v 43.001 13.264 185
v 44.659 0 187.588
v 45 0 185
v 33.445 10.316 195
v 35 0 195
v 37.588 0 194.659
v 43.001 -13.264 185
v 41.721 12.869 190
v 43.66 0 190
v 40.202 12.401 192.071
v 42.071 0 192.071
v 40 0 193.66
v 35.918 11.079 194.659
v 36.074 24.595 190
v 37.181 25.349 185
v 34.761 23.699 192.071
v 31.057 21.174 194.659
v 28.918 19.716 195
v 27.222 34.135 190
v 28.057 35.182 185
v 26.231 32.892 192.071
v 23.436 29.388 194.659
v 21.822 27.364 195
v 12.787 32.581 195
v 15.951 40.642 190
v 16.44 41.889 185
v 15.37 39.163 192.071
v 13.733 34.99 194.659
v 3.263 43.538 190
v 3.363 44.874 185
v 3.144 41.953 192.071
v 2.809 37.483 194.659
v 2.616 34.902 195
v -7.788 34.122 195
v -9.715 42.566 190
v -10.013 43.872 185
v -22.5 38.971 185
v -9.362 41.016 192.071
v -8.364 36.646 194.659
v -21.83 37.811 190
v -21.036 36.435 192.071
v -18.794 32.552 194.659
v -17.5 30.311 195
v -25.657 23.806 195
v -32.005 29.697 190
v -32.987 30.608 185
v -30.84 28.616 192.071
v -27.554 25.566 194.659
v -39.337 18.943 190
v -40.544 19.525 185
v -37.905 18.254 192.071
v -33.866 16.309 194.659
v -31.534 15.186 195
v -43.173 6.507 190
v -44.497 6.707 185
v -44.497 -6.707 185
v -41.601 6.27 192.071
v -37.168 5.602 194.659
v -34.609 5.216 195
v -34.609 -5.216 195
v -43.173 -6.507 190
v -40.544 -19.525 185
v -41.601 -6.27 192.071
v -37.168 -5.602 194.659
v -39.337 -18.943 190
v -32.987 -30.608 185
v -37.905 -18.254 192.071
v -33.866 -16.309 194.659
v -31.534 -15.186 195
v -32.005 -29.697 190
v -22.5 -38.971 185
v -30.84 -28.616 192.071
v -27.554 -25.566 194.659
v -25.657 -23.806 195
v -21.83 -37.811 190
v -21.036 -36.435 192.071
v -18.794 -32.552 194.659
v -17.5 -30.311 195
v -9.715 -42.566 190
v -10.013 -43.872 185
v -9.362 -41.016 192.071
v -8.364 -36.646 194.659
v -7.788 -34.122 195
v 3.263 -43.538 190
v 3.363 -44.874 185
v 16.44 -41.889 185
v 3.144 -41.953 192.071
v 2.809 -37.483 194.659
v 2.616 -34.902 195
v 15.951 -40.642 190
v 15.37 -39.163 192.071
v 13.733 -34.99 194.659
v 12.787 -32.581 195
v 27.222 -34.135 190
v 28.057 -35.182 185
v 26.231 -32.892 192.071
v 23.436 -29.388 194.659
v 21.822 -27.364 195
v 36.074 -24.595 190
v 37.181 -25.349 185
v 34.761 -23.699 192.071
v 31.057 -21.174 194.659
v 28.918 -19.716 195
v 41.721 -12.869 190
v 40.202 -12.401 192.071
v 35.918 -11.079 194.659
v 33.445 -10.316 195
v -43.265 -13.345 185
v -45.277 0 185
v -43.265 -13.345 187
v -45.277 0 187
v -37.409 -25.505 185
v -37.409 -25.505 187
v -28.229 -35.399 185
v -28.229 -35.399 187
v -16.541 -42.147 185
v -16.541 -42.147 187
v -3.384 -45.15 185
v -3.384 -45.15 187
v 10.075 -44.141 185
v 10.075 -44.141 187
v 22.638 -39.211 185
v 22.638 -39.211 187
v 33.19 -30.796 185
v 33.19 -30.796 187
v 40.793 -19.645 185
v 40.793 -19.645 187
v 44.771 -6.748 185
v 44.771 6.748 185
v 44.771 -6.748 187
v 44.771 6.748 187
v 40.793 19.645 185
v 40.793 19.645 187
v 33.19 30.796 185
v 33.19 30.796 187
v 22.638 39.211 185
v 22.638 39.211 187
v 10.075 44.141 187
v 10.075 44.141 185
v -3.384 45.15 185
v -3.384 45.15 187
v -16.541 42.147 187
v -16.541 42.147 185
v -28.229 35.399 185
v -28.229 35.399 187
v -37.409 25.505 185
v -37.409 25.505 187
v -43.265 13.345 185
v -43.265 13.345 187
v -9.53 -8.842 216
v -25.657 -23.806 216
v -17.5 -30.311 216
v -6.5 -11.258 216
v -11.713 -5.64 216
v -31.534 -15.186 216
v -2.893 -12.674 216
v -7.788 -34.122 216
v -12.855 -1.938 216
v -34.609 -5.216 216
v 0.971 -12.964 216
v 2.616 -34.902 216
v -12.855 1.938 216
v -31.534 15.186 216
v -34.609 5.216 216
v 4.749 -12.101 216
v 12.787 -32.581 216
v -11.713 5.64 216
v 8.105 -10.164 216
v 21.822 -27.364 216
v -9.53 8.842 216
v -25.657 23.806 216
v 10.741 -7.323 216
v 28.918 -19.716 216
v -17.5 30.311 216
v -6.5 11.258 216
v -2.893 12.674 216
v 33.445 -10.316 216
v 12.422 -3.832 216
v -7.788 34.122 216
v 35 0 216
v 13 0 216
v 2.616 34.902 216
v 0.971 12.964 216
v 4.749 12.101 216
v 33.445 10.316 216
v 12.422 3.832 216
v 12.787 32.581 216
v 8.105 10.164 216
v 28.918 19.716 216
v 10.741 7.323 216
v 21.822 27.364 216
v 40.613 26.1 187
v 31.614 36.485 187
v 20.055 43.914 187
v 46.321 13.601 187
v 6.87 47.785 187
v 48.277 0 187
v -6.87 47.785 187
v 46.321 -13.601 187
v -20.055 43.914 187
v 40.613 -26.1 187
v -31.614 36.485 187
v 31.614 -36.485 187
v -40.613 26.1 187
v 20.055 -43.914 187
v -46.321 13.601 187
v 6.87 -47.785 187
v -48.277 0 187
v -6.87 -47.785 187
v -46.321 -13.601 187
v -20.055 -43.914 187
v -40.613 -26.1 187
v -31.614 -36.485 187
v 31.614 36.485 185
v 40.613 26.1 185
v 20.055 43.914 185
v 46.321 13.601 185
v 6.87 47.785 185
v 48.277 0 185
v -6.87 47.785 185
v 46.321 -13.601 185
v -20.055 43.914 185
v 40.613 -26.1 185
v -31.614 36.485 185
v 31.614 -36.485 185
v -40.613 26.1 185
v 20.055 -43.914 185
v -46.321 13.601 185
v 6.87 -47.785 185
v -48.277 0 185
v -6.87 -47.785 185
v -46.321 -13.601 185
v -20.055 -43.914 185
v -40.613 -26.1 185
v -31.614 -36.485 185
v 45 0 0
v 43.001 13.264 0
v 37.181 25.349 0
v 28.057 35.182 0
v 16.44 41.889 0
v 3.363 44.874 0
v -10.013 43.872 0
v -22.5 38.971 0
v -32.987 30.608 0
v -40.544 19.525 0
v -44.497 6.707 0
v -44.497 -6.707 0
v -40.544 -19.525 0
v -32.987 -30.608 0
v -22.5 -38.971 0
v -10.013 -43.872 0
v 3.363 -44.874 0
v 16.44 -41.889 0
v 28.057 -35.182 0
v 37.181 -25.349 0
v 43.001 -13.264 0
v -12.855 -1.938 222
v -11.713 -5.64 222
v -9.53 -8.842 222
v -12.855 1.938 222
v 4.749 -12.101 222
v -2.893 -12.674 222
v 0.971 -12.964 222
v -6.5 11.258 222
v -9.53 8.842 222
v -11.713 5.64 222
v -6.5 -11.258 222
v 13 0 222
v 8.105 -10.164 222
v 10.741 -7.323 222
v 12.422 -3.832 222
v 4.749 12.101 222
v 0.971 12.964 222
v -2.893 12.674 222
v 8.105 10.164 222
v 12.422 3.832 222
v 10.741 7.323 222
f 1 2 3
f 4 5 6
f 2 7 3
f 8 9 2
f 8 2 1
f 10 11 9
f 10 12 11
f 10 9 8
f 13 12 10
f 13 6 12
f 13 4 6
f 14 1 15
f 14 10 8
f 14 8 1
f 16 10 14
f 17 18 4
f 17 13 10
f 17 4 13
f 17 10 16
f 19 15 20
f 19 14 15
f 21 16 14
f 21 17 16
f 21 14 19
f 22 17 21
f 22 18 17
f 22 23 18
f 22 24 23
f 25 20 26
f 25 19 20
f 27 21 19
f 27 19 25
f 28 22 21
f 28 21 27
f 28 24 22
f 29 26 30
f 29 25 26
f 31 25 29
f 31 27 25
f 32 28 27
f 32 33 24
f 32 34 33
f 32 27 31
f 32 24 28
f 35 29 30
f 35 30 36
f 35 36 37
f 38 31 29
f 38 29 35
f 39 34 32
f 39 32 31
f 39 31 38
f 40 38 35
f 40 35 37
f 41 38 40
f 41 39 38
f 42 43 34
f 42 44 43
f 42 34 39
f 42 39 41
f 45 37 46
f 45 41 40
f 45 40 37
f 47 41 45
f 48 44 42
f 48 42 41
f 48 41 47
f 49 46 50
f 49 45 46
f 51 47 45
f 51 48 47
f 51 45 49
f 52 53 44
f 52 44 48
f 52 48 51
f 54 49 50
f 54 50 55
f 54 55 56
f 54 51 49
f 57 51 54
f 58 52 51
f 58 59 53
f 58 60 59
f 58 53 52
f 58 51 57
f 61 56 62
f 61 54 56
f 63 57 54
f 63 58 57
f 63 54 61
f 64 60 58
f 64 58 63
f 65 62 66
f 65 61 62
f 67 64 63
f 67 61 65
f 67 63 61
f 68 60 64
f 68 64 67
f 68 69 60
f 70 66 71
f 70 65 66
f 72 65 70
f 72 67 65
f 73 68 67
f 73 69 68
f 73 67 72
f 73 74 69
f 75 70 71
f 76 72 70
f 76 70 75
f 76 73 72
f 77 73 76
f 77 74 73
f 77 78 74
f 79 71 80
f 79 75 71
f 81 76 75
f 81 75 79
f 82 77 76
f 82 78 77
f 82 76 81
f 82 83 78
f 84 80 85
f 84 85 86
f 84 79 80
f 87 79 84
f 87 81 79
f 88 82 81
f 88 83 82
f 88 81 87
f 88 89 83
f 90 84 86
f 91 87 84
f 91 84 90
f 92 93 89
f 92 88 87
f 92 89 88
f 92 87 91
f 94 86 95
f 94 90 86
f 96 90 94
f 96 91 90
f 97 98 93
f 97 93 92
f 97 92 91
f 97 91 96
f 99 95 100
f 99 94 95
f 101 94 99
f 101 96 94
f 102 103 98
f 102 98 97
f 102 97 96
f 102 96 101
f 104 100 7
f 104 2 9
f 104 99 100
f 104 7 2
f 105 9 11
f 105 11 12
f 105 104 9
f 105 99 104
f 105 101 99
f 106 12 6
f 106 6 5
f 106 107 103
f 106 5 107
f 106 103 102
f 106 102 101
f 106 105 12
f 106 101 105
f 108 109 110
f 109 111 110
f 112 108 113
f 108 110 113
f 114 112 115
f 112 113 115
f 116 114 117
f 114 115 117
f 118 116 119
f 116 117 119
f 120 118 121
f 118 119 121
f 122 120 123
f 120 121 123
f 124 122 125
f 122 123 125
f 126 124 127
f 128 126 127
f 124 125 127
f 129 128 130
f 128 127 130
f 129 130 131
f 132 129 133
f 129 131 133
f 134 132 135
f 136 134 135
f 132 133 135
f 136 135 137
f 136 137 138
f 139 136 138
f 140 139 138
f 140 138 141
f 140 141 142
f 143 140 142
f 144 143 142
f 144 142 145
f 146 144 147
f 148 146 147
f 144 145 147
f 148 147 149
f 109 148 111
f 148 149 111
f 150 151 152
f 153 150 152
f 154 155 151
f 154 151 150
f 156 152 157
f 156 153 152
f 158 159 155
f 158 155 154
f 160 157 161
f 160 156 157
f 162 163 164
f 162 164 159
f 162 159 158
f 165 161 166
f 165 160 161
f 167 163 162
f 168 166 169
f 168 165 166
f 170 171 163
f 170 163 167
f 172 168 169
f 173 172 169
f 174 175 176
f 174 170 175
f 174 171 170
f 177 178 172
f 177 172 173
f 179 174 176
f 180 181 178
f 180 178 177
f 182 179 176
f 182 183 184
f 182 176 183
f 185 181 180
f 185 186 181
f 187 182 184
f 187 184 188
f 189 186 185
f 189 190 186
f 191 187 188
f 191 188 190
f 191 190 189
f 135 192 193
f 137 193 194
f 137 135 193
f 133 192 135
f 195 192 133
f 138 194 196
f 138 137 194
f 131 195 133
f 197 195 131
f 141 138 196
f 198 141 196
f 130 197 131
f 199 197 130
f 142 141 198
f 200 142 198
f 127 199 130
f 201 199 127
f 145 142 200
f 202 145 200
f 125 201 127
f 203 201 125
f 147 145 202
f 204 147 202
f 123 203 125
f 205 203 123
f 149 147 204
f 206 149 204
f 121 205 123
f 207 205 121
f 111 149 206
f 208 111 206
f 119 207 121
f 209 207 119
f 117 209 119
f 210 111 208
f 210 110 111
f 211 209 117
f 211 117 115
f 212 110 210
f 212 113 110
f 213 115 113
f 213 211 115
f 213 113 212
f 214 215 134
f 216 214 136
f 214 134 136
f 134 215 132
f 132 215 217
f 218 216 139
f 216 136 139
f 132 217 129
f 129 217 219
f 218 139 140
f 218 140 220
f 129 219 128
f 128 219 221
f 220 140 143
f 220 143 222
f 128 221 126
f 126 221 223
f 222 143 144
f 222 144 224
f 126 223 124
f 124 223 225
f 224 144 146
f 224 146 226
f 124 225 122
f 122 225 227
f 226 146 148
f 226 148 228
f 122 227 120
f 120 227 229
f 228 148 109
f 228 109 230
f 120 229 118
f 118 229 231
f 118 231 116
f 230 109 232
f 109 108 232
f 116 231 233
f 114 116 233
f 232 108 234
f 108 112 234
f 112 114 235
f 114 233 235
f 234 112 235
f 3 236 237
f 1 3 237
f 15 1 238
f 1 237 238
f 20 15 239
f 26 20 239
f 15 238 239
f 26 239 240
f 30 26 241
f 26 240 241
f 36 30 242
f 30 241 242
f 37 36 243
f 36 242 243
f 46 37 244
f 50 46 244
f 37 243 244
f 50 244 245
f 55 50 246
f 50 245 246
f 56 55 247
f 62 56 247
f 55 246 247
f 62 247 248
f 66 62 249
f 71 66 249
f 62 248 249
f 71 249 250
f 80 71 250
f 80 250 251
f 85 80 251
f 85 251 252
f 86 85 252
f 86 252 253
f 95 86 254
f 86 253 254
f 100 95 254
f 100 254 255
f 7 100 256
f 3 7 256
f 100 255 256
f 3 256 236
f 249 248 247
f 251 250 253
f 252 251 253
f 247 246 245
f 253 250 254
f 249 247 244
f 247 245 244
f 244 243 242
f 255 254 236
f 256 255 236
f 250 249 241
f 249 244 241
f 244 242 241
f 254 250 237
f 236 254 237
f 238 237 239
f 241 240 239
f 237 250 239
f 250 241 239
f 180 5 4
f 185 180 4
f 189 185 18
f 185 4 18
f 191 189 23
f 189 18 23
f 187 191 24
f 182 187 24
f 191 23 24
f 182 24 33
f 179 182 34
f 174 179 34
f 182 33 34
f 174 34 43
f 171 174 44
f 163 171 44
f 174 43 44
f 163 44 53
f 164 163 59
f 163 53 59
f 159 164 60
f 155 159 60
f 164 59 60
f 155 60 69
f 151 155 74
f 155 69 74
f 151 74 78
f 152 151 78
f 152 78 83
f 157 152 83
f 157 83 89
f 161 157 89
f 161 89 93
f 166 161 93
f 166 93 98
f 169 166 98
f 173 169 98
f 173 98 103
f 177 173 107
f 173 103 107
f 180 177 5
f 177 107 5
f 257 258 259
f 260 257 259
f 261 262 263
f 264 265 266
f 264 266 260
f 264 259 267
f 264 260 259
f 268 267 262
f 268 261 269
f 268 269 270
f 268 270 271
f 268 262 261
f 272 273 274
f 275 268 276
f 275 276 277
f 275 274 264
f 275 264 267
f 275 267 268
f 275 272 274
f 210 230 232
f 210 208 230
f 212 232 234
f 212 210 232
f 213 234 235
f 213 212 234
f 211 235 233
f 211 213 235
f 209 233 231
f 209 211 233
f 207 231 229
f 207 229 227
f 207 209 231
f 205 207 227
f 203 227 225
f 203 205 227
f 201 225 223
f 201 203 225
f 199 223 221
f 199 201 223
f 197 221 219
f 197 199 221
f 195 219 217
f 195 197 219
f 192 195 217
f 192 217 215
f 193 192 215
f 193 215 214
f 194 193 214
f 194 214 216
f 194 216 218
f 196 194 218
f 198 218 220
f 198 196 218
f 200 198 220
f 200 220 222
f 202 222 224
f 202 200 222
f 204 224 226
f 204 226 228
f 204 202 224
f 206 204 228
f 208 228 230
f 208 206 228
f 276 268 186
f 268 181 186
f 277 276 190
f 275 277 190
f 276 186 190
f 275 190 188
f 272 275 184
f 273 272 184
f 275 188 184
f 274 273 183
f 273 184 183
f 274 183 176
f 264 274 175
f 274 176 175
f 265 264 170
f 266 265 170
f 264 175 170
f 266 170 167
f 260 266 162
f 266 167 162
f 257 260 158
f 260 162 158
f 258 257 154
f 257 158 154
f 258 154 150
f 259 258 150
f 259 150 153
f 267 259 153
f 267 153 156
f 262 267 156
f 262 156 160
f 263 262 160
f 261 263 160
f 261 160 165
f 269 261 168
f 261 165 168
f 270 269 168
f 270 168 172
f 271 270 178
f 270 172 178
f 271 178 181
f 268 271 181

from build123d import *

# Parameters (mm, degrees)
F0_R      = 45
F1_DEPTH  = 195
F2_R      = 10
F3_R      = 35
F4_DEPTH  = 21
F5_W      = 3
F5_H      = 2
F7_R      = 13
F8_DEPTH  = 3
F9_R      = 13
F10_DEPTH = 3


with BuildPart() as f1:
    # F0 (on Top) → F1 (new body)
    with BuildSketch(Plane.XY):
        Circle(F0_R)
    extrude(amount=F1_DEPTH)

    # F2
    f2_edges = [f1.edges().sort_by_distance(p)[0] for p in [
        (-45, 0, 195),
    ]]
    fillet(f2_edges, radius=F2_R)

    # F3 (on face) → F4 (join)
    with BuildSketch(Plane.XY.offset(195)):
        Circle(F3_R)
    extrude(amount=F4_DEPTH)

    # F7 (on face) → F8 (join)
    with BuildSketch(Plane.XY.offset(216)):
        Circle(F7_R)
    extrude(amount=F8_DEPTH)

    # F9 (on face) → F10 (join)
    with BuildSketch(Plane.XY.offset(219)):
        Circle(F9_R)
    extrude(amount=F10_DEPTH)


with BuildPart() as f6:
    # F5 (on Front) → F6 (revolve)
    with BuildSketch(Plane.XZ):
        with Locations((-46.7765510678, 186)):
            Rectangle(F5_W, F5_H)
    revolve(axis=Axis((0, 0, 185), (0, 0, 1)))


solid = Compound([f1.part, f6.part])
